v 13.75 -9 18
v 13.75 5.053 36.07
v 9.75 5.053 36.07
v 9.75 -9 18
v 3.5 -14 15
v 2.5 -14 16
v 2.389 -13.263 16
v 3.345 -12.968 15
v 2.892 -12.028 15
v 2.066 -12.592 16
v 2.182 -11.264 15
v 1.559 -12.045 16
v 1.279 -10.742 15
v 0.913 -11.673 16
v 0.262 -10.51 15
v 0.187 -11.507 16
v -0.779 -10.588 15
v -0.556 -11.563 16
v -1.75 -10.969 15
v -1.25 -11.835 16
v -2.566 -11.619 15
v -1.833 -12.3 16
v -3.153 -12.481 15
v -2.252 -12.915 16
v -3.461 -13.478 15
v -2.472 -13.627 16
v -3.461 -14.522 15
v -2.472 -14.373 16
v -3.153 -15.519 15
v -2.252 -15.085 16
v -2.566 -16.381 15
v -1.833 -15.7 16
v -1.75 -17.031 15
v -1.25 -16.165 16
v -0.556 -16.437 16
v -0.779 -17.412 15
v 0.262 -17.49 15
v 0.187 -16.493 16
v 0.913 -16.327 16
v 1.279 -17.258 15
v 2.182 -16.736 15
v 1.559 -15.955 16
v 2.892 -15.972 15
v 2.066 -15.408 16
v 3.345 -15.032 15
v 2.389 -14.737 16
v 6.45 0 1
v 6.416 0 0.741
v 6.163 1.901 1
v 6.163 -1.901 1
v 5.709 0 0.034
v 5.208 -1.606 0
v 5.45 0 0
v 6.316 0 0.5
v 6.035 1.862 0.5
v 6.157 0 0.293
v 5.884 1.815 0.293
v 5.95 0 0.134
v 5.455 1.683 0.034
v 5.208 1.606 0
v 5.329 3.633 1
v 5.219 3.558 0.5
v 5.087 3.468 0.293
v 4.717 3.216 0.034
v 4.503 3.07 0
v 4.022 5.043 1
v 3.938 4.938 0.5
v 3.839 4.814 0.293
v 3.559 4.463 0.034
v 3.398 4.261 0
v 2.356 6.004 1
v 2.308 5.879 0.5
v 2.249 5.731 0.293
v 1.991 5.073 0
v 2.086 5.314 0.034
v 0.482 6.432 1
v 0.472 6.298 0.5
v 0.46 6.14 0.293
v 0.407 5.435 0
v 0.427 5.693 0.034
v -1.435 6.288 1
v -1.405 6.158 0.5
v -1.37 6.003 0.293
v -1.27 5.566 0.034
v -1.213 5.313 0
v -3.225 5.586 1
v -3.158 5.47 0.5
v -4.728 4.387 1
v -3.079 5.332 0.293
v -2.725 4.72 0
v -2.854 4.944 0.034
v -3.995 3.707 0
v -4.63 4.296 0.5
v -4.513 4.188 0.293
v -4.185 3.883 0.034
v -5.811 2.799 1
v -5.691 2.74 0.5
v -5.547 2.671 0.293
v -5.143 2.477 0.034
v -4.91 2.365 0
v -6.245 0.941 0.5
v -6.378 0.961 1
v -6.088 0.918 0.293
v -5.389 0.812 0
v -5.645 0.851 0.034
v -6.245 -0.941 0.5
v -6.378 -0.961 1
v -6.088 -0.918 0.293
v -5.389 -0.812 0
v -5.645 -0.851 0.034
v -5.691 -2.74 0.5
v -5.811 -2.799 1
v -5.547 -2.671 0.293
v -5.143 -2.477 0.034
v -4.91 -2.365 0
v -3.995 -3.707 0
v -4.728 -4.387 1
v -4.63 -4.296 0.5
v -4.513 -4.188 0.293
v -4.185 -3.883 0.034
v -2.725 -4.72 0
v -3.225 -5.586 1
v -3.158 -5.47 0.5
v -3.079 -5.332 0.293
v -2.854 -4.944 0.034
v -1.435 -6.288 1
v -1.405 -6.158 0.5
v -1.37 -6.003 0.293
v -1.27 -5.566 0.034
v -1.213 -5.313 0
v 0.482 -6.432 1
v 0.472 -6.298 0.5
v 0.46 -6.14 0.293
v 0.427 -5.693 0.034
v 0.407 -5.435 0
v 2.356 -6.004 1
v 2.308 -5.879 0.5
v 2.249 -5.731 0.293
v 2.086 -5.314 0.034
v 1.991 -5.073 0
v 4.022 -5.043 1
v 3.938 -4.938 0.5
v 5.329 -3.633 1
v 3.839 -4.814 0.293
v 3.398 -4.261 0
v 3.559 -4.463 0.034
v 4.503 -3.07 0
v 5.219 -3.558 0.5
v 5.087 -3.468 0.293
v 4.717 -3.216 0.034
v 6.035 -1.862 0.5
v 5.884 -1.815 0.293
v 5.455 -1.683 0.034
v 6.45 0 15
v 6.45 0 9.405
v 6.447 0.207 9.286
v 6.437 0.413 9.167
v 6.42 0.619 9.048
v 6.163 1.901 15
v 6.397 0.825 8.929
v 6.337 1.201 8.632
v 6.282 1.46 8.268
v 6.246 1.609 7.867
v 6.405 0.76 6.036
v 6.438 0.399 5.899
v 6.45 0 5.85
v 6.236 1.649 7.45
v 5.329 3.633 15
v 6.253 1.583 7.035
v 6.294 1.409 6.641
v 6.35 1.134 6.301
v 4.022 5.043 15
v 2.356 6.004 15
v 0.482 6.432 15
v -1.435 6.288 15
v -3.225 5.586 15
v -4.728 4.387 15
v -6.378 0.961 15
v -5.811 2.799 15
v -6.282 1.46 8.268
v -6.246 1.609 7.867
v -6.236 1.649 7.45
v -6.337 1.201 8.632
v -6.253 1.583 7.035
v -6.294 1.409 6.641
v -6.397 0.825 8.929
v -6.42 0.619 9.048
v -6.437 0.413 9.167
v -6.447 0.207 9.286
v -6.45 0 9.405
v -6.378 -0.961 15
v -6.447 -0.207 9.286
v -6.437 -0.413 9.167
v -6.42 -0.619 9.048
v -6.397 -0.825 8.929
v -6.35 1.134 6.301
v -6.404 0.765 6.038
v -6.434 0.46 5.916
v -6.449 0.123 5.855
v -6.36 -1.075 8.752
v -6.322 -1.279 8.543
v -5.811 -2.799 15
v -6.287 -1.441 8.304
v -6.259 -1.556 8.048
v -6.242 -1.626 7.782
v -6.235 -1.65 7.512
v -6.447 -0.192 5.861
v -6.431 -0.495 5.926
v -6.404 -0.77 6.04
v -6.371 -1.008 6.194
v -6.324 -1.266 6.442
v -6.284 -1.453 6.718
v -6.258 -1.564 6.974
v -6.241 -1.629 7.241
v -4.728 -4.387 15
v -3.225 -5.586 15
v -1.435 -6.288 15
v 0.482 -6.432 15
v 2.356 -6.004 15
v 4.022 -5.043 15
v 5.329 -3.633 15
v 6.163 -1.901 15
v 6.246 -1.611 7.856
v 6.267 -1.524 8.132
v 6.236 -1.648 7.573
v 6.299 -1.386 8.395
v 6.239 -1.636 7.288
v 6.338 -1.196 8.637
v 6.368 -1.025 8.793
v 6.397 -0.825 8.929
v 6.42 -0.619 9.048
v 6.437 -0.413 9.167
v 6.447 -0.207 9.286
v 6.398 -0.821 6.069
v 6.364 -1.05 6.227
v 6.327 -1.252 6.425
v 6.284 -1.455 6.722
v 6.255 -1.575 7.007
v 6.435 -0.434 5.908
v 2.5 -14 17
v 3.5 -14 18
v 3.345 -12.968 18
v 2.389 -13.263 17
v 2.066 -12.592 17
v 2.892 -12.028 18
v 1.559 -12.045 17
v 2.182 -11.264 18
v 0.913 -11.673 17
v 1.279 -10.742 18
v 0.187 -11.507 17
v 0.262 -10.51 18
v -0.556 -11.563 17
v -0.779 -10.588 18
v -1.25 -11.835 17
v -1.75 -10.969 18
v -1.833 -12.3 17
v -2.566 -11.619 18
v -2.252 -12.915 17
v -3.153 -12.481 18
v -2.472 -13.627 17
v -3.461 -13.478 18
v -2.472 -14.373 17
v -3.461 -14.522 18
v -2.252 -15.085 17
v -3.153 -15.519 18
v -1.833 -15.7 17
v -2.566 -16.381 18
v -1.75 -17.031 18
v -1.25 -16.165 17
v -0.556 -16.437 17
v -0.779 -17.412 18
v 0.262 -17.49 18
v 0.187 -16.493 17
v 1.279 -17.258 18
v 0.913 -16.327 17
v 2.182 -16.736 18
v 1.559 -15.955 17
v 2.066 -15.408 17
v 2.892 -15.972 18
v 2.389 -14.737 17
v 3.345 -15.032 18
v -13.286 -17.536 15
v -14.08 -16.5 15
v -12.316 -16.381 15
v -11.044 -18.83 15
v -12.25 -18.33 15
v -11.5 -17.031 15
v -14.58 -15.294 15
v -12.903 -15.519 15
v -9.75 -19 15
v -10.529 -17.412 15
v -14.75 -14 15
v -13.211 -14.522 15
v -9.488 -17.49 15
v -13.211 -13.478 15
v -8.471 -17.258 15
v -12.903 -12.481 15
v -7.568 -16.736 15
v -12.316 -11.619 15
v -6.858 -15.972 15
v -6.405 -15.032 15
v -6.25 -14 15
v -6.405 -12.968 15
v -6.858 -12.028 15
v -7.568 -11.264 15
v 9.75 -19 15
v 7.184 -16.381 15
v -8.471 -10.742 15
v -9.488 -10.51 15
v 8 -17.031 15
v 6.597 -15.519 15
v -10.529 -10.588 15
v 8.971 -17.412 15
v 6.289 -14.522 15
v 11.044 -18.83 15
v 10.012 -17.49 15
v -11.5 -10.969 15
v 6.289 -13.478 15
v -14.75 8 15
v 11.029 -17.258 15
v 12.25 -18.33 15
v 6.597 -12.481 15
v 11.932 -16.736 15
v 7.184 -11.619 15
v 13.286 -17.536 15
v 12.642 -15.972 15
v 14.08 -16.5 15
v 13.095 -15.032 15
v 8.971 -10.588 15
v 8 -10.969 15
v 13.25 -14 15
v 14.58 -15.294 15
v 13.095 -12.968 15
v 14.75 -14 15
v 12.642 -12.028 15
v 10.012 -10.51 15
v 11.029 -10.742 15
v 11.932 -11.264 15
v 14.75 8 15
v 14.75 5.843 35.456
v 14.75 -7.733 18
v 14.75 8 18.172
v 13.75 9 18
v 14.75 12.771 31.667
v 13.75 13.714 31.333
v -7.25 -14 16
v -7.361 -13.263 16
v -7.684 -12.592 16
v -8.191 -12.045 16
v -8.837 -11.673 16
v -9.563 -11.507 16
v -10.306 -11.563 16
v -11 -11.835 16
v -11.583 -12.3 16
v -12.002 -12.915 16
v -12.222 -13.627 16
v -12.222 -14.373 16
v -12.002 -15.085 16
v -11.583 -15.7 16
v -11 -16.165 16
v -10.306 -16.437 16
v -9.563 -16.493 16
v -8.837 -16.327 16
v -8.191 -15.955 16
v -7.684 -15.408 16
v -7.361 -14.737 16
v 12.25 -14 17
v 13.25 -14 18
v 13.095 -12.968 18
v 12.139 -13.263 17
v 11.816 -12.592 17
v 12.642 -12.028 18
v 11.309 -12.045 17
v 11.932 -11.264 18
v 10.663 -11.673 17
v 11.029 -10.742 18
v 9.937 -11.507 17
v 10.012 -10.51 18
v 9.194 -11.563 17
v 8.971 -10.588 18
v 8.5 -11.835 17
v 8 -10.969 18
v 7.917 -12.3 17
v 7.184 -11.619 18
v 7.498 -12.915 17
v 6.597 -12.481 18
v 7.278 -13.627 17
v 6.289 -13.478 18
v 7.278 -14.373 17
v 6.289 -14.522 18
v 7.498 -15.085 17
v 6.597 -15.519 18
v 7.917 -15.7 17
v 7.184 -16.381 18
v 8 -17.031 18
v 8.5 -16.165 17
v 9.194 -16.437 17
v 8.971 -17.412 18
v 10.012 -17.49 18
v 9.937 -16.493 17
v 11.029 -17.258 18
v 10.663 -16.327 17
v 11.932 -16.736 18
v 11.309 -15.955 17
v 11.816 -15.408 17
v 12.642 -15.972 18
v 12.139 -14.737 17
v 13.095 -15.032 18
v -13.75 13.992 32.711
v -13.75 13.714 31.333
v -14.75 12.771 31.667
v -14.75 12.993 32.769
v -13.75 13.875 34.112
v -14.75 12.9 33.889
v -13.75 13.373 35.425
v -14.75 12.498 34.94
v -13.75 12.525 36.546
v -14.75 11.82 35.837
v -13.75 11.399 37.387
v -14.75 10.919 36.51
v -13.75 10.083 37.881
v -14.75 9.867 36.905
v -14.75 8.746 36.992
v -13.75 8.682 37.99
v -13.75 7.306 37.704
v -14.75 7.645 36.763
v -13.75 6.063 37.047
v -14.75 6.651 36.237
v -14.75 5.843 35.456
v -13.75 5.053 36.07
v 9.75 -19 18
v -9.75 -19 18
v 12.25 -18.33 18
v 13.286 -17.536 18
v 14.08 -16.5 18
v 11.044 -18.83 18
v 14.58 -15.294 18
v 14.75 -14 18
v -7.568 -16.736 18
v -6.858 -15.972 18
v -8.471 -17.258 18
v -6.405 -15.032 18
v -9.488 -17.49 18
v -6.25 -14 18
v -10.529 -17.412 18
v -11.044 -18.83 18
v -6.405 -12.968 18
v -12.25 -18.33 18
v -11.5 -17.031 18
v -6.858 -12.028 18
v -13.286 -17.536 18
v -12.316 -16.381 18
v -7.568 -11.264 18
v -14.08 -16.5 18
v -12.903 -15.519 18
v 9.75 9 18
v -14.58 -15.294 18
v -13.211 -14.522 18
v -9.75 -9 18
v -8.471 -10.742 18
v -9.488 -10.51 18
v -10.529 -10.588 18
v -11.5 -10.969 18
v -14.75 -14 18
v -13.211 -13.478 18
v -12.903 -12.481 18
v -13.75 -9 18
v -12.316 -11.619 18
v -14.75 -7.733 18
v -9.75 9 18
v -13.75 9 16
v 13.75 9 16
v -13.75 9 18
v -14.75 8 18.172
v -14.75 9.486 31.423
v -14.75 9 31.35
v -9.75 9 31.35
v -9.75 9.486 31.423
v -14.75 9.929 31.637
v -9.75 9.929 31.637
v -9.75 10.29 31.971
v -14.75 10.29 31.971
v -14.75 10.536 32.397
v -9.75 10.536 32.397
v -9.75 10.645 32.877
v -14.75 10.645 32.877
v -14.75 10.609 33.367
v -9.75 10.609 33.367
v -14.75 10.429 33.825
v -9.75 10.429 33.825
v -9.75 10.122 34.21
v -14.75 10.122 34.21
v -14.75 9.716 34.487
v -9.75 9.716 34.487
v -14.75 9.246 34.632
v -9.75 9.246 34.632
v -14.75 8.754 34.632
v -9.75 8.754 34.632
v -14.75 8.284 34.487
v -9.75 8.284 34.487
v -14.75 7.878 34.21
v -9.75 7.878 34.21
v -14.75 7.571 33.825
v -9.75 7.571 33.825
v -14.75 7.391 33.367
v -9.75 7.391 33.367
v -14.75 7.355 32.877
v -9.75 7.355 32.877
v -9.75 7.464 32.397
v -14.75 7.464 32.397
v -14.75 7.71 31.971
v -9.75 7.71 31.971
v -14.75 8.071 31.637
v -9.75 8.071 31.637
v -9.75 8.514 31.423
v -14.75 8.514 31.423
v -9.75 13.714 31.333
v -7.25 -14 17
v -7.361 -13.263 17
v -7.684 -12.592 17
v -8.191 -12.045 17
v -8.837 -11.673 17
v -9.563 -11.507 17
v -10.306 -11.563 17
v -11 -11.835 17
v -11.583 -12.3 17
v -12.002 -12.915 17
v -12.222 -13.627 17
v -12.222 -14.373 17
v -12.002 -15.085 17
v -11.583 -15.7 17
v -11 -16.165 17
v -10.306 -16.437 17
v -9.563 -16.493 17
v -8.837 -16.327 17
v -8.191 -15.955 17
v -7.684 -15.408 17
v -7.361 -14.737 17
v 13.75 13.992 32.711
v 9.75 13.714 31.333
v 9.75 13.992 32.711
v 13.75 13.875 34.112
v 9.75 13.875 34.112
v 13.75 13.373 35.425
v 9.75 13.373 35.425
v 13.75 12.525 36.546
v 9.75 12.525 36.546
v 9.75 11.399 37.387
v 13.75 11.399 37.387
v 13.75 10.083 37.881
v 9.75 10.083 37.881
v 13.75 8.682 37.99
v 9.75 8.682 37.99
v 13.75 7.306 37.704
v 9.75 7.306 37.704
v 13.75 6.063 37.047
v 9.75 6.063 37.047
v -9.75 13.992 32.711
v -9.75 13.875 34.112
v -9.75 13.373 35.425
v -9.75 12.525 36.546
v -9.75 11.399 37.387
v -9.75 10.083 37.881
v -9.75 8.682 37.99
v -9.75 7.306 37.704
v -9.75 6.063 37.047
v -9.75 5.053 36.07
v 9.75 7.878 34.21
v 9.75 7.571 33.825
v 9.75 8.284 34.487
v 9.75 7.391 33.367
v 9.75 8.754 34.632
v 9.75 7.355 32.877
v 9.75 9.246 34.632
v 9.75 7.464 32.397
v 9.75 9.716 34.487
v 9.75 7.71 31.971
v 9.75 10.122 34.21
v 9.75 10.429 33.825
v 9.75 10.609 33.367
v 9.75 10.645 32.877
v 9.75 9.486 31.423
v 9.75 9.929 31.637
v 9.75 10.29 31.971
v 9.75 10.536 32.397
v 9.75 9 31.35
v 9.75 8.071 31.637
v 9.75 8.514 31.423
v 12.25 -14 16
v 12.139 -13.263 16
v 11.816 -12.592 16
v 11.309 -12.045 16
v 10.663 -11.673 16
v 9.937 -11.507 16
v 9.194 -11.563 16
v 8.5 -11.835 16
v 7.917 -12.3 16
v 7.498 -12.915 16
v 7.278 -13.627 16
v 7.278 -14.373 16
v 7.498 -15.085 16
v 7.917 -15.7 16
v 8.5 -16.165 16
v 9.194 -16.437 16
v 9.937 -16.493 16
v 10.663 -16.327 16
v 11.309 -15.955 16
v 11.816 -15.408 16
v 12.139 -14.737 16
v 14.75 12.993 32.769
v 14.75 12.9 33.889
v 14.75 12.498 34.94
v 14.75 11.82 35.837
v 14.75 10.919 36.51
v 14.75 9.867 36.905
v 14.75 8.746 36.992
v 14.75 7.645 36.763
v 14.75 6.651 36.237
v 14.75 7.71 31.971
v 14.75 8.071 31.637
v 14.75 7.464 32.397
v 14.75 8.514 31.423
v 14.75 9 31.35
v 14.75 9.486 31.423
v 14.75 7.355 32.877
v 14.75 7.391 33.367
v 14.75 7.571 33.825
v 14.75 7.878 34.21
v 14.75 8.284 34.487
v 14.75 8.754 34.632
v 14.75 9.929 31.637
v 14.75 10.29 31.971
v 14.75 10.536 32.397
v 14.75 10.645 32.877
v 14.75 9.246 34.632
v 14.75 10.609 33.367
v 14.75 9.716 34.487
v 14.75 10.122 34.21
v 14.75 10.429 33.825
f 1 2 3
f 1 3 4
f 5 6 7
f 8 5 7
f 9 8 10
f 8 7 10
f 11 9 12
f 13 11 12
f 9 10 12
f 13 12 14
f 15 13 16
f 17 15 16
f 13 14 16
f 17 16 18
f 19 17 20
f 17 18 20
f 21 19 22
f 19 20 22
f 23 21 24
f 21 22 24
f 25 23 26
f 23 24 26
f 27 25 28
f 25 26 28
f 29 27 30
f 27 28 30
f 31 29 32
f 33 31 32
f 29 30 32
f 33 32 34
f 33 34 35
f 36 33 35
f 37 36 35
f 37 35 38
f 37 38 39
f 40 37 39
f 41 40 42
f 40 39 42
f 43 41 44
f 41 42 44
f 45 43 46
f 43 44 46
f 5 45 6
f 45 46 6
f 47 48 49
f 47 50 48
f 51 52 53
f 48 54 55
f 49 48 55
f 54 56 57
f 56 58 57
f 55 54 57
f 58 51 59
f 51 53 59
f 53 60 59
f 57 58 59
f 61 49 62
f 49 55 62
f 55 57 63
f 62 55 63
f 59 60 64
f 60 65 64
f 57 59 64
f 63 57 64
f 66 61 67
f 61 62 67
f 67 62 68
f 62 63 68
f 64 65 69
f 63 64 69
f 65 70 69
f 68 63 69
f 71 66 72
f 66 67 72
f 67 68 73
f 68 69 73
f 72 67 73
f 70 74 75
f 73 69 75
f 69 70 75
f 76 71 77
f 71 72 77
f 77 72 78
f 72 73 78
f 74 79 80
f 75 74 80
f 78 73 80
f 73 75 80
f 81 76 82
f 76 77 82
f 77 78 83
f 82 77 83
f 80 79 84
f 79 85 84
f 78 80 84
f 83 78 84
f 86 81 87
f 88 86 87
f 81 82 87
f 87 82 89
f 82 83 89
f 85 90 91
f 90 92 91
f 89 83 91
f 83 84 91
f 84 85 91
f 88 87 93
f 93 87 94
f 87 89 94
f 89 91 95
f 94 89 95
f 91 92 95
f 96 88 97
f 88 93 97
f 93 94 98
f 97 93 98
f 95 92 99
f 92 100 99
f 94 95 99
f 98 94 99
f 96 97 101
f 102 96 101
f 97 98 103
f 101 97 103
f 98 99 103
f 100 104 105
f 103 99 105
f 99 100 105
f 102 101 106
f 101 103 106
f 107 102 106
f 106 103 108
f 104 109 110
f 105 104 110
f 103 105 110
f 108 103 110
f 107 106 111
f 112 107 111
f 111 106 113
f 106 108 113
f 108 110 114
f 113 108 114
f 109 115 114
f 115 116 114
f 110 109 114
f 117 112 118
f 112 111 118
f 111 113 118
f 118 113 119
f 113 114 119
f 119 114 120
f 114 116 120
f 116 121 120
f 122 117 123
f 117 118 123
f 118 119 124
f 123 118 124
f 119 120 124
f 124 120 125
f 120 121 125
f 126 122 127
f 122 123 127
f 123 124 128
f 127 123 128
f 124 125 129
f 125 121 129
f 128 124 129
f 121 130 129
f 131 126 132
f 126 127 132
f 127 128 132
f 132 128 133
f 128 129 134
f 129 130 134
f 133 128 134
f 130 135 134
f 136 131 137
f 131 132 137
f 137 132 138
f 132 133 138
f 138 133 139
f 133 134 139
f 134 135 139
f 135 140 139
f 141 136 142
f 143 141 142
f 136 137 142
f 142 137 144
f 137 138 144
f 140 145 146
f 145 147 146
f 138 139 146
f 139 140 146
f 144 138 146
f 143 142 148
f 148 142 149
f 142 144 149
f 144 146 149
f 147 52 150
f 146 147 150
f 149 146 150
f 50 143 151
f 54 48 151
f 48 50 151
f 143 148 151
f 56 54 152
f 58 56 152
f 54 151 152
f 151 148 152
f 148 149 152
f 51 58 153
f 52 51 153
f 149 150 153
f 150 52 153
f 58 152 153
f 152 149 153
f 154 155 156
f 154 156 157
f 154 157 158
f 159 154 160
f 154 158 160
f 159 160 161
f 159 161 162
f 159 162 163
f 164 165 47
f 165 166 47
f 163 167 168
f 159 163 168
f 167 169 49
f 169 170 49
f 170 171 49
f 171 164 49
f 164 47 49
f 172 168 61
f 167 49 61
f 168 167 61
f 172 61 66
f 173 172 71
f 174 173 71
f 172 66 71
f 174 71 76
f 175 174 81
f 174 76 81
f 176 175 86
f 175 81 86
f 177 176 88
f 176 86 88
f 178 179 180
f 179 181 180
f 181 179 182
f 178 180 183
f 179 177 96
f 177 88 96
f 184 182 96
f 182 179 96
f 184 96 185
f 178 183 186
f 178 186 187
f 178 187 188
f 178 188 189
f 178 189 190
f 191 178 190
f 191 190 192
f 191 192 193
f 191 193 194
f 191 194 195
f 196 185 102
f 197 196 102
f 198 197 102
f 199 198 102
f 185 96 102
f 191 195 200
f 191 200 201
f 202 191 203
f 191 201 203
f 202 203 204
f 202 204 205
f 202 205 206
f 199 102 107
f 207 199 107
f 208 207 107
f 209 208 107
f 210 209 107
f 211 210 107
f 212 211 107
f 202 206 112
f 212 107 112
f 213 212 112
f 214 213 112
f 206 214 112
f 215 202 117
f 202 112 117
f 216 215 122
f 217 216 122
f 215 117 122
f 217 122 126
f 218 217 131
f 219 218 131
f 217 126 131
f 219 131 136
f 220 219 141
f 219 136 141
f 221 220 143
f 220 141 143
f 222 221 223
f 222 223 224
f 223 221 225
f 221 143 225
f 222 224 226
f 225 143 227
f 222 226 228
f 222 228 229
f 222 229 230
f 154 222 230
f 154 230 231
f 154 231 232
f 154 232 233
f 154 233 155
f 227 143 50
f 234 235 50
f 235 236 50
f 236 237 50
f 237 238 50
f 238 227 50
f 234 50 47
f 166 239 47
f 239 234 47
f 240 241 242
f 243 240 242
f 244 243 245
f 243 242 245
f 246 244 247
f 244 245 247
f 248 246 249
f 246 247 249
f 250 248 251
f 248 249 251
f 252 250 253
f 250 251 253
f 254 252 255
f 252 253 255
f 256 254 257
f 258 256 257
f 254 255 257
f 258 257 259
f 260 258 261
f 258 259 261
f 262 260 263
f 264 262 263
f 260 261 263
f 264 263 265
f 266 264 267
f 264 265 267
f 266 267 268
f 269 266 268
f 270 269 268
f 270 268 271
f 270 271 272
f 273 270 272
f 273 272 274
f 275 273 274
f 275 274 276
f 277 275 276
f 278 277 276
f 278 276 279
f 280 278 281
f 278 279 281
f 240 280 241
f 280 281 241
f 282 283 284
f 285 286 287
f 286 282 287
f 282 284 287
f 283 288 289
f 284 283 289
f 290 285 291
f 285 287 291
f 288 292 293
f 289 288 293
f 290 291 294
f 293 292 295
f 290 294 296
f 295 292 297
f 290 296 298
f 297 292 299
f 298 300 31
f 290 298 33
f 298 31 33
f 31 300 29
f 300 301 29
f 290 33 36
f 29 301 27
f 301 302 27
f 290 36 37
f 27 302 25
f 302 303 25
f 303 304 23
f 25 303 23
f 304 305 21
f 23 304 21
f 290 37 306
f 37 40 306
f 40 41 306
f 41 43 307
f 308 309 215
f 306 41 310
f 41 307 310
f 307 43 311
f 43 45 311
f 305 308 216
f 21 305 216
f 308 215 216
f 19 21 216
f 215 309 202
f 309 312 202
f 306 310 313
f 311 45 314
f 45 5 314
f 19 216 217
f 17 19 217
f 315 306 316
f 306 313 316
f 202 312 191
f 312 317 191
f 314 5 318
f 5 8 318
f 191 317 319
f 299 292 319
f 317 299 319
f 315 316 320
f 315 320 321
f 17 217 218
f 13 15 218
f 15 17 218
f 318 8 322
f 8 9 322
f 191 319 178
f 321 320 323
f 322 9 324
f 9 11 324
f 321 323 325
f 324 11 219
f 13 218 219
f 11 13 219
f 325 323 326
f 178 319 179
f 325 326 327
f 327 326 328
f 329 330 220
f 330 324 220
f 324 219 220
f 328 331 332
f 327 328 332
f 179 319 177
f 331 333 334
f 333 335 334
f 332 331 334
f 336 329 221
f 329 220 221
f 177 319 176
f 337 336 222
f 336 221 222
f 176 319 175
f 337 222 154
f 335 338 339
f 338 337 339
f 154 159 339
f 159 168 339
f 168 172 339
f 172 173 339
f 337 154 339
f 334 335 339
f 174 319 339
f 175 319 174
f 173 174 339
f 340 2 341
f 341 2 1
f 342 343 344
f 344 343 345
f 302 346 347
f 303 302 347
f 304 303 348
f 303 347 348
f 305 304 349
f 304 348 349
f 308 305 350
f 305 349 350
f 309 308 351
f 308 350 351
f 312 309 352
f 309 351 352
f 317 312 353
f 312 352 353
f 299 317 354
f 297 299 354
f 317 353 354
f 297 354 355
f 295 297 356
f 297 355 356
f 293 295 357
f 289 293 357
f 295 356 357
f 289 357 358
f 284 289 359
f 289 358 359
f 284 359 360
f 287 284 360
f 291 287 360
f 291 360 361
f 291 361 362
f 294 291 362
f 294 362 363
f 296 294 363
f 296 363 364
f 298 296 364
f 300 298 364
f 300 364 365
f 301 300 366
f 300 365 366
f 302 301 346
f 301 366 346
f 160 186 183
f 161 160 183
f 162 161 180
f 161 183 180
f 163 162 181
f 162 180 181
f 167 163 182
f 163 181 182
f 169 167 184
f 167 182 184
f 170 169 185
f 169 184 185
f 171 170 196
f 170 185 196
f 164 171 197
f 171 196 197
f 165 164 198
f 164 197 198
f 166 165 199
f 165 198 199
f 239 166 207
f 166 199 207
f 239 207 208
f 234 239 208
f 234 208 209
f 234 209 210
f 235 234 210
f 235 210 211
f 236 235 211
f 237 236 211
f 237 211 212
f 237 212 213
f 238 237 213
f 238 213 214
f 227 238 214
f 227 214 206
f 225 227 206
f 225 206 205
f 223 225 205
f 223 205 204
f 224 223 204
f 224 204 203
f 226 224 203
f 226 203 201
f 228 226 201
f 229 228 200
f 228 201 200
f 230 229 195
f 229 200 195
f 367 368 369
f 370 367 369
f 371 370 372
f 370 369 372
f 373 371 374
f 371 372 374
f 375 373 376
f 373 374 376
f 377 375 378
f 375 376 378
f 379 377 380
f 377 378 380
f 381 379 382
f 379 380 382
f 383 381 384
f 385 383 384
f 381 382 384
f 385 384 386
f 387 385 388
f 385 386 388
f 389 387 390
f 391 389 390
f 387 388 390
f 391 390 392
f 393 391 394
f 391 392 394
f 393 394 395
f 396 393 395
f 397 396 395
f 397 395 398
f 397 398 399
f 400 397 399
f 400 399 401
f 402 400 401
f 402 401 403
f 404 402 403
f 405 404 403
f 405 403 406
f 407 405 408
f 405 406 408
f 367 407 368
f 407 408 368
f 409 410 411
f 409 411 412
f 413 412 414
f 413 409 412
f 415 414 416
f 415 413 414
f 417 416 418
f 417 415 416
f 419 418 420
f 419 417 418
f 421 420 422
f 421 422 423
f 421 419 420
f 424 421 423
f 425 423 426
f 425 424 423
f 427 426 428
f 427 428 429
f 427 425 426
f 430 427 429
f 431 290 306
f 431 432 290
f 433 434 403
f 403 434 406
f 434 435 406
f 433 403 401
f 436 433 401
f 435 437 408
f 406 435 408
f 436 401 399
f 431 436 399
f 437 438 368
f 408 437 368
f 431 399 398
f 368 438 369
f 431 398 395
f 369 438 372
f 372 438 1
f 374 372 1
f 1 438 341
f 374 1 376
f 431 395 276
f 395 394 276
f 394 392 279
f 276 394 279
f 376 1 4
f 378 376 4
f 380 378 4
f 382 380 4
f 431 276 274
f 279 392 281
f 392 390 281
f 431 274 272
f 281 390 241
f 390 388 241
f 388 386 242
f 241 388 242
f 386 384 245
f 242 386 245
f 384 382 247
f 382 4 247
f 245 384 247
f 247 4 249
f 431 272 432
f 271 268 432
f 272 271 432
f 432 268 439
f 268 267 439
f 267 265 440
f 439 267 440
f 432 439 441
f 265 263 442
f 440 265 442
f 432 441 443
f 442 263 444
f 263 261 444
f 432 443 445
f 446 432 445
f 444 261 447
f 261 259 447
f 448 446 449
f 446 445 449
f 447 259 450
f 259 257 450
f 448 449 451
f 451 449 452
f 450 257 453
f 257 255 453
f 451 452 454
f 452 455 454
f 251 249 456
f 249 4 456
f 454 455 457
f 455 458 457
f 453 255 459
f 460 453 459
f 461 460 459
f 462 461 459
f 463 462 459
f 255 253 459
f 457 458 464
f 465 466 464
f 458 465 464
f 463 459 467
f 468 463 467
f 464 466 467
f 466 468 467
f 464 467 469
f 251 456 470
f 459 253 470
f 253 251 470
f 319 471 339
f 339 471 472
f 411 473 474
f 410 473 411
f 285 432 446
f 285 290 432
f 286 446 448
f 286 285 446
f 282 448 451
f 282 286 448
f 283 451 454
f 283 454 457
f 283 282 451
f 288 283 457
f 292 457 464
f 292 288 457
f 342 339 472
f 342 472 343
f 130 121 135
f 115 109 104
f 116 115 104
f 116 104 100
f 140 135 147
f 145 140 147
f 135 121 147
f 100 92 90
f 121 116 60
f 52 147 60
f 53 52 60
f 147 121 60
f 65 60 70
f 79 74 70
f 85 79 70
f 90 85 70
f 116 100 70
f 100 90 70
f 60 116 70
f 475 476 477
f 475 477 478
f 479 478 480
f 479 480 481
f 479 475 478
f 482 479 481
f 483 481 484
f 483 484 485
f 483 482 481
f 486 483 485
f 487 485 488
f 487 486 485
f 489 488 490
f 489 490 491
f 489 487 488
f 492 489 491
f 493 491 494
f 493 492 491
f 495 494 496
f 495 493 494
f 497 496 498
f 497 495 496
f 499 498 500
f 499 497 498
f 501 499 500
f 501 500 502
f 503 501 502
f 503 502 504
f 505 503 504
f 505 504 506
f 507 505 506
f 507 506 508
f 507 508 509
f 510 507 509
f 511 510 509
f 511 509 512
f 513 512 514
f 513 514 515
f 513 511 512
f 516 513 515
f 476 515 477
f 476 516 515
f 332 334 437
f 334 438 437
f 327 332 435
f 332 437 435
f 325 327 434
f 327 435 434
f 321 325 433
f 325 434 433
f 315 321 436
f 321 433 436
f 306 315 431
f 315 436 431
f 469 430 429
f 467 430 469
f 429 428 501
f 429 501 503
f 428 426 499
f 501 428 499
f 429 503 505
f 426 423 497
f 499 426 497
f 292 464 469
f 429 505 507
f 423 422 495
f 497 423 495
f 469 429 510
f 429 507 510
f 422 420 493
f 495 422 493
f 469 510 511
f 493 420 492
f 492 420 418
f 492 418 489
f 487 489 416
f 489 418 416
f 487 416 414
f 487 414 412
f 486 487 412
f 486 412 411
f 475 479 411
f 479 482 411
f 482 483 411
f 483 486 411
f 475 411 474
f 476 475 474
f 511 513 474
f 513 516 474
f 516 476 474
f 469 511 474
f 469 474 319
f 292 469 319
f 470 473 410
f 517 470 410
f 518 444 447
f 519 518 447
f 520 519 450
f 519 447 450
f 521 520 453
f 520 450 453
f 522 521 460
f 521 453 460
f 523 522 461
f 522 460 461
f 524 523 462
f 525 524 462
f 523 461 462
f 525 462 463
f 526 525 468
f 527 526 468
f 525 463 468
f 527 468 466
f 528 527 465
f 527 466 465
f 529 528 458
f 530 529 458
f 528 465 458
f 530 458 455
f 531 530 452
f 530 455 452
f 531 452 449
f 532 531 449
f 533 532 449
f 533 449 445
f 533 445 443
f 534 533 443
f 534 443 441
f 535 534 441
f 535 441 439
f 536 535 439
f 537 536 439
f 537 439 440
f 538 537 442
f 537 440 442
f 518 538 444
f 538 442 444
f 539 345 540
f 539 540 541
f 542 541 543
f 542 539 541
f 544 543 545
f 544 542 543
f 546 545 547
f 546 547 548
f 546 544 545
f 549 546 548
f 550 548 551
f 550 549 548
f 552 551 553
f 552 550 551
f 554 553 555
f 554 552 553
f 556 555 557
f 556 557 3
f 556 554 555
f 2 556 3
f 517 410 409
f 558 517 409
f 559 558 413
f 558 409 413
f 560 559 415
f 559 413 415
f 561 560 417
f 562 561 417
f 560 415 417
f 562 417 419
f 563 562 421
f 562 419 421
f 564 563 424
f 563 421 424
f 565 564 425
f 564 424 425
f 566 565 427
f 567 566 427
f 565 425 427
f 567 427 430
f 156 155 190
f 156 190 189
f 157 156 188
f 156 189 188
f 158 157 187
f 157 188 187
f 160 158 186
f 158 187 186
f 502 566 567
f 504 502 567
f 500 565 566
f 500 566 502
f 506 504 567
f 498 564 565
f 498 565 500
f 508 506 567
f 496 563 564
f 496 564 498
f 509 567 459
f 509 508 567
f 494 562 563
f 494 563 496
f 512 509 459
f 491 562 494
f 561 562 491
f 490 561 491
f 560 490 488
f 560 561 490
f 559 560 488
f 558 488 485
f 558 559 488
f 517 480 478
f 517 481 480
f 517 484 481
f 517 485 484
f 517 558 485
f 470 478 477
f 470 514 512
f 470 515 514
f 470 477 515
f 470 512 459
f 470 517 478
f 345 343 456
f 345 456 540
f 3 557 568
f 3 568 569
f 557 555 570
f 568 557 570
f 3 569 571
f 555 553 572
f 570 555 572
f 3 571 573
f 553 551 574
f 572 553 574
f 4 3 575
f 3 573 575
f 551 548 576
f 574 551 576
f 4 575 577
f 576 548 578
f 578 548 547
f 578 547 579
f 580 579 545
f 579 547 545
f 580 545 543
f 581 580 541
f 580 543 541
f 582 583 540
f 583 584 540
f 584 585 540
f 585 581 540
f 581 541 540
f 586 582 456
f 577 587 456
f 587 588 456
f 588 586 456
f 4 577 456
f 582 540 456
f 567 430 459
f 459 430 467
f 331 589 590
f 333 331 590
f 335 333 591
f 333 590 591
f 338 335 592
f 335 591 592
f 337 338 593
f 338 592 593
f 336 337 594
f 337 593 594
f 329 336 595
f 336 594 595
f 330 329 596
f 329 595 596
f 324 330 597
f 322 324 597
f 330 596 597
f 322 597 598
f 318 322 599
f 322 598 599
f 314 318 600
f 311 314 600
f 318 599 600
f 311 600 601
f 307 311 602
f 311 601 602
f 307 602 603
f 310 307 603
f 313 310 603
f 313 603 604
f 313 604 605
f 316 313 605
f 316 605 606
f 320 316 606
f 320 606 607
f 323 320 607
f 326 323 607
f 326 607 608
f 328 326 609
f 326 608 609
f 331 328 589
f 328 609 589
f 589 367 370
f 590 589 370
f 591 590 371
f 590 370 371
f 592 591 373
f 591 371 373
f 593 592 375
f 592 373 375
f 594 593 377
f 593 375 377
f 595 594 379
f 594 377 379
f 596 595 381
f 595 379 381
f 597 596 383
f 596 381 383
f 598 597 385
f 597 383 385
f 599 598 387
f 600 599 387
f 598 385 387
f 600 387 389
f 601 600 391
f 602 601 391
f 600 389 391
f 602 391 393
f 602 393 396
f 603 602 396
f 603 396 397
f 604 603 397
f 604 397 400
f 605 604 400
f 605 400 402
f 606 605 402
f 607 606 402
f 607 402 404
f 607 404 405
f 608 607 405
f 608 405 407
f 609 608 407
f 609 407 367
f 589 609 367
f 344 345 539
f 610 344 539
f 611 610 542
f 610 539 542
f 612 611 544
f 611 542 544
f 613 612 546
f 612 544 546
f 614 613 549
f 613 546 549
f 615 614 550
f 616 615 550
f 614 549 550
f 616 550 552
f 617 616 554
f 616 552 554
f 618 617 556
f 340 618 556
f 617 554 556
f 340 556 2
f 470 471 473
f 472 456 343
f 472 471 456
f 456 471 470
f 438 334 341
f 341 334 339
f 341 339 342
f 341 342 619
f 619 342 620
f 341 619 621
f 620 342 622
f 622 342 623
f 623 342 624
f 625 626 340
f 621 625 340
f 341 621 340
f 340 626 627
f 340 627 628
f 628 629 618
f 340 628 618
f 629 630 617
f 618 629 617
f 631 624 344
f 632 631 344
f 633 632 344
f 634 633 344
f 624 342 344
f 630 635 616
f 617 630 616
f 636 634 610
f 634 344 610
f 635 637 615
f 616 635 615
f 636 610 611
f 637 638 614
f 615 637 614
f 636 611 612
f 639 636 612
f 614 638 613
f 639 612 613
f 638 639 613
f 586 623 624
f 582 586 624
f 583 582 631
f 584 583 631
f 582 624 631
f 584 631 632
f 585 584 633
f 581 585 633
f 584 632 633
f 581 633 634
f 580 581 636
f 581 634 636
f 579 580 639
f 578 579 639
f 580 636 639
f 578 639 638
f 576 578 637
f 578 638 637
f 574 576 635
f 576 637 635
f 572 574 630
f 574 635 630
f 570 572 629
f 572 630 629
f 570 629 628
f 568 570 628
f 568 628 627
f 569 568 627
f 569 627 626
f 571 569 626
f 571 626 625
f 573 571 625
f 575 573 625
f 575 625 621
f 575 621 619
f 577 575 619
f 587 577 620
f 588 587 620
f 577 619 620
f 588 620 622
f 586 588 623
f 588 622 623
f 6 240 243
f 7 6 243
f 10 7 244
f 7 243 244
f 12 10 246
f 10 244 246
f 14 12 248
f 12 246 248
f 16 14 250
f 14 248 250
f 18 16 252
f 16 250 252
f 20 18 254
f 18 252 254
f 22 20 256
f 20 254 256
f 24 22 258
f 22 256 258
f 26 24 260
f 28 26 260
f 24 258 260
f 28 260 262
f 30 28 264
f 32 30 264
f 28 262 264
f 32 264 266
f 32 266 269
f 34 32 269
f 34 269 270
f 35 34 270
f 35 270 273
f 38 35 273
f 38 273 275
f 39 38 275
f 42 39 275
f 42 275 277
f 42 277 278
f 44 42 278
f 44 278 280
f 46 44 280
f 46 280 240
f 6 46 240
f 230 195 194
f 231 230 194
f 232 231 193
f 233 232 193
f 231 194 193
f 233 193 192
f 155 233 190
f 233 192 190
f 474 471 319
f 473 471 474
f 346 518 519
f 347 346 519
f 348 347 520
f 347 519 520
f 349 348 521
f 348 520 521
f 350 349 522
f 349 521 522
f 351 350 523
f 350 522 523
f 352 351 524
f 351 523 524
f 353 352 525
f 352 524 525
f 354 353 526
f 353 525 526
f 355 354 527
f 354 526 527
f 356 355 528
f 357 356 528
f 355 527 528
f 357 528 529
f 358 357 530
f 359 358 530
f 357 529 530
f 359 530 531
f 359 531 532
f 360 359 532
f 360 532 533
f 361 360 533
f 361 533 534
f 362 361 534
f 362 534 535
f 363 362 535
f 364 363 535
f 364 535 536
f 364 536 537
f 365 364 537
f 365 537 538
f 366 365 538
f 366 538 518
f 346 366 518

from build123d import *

# Parameters (mm, degrees)
SKETCH_1_R               = 6.45
EXTRUDE_1_DEPTH          = 15
SKETCH_2_W               = 29.5
SKETCH_2_H               = 18
EXTRUDE_2_DEPTH          = 3
EXTRUDE_START            = 14.75
SKETCH_3_R               = 1.65
EXTRUDE_3_DEPTH          = 5
EXTRUDE_START_2          = -14.75
SKETCH_3_2_R             = 1.65
EXTRUDE_4_DEPTH          = 5
EXTRUDE_5_DEPTH          = 10
FILLET_1_R               = 5
SKETCH_5_R               = 2.5
CUT_EXTRUDE_1_DEPTH      = 19
CHAMFER_1_SIZE           = 1
CHAMFER_2_SIZE           = 1
CUT_EXTRUDE_2_DEPTH      = 15.75
CUT_EXTRUDE_2_DEPTH_BACK = 15.75
FILLET_2_R               = 1


with BuildPart() as part:
    # ｽｹｯﾁ1 → ﾎﾞｽ - 押し出し1 (new body)
    with BuildSketch(Plane.XY):
        Circle(SKETCH_1_R)
    extrude(amount=EXTRUDE_1_DEPTH)

    # ｽｹｯﾁ2 → ﾎﾞｽ - 押し出し2 (add)
    with BuildSketch(Plane.XY.offset(15)):
        Rectangle(SKETCH_2_W, SKETCH_2_H)
    extrude(amount=EXTRUDE_2_DEPTH)

    # ｽｹｯﾁ3 → ﾎﾞｽ - 押し出し3 (add)
    with BuildSketch(Plane(origin=(0, 0, 0), x_dir=(0, 0, -1), z_dir=(1, 0, 0)).offset(EXTRUDE_START)):
        with BuildLine():
            Line((-18, 9), (-31.333333333, 13.714045208))
            ThreePointArc((-31.333333333, 13.714045208), (-37.386897866, 11.398984601), (-36.069570429, 5.053135753))
            Line((-36.069570429, 5.053135753), (-18, -9))
            Line((-18, -9), (-18, 9))
        make_face()
        with Locations((-33, 9)):
            Circle(SKETCH_3_R, mode=Mode.SUBTRACT)
    extrude(amount=-EXTRUDE_3_DEPTH)

    # ｽｹｯﾁ3<2> → ﾎﾞｽ - 押し出し4 (add)
    with BuildSketch(Plane(origin=(0, 0, 0), x_dir=(0, 0, -1), z_dir=(1, 0, 0)).offset(EXTRUDE_START_2)):
        with BuildLine():
            Line((-18, 9), (-31.333333333, 13.714045208))
            ThreePointArc((-31.333333333, 13.714045208), (-37.386897866, 11.398984601), (-36.069570429, 5.053135753))
            Line((-36.069570429, 5.053135753), (-18, -9))
            Line((-18, -9), (-18, 9))
        make_face()
        with Locations((-33, 9)):
            Circle(SKETCH_3_2_R, mode=Mode.SUBTRACT)
    extrude(amount=EXTRUDE_4_DEPTH)

    # ｽｹｯﾁ4 → ﾎﾞｽ - 押し出し5 (add)
    with BuildSketch(Plane.XZ.offset(9)):
        Polygon((-14.75, 15), (14.75, 15), (14.75, 18), (9.75, 18), (-9.75, 18), (-14.75, 18), align=None)
    extrude(amount=EXTRUDE_5_DEPTH)

    # ﾌｨﾚｯﾄ1
    fillet_1_edges = [part.edges().sort_by_distance(p)[0] for p in [
        (-14.75, -19, 16.5),
        (14.75, -19, 16.5),
    ]]
    fillet(fillet_1_edges, radius=FILLET_1_R)

    # ｽｹｯﾁ5 → ｶｯﾄ - 押し出し1 (cut, through all)
    with BuildSketch(Plane.XY.offset(18)):
        with Locations((0, -14)):
            Circle(SKETCH_5_R)
        with Locations((-9.75, -14)):
            Circle(SKETCH_5_R)
        with Locations((9.75, -14)):
            Circle(SKETCH_5_R)
    extrude(amount=-CUT_EXTRUDE_1_DEPTH, mode=Mode.SUBTRACT)

    # 面取り1
    chamfer_1_edges = [part.edges().sort_by_distance(p)[0] for p in [
        (7.25, -14, 15),
        (7.25, -14, 18),
        (-12.25, -14, 15),
        (-12.25, -14, 18),
        (-2.5, -14, 15),
        (-2.5, -14, 18),
    ]]
    chamfer(chamfer_1_edges, length=CHAMFER_1_SIZE)

    # 面取り2
    chamfer_2_edges = [part.edges().sort_by_distance(p)[0] for p in [
        (-14.75, 9, 16.5),
        (0, 9, 15),
        (14.75, 9, 16.5),
        (-14.75, 11.357022604, 24.666666667),
        (-14.75, 11.398984601, 37.386897866),
        (-14.75, -1.973432123, 27.034785215),
        (14.75, 11.357022604, 24.666666667),
        (14.75, 11.398984601, 37.386897866),
        (14.75, -1.973432123, 27.034785215),
    ]]
    chamfer(chamfer_2_edges, length=CHAMFER_2_SIZE)

    # ｽｹｯﾁ6 → ｶｯﾄ - 押し出し2 (cut, two sides)
    with BuildSketch(Plane(origin=(0, 0, 0), x_dir=(0, 0, -1), z_dir=(1, 0, 0))) as cut_extrude_2_sk:
        with BuildLine():
            Line((-8.928941916, -0.825), (-9.405255888, 0))
            Line((-9.405255888, 0), (-8.928941916, 0.825))
            ThreePointArc((-8.928941916, 0.825), (-5.85, 0), (-8.928941916, -0.825))
        make_face()
    extrude(amount=CUT_EXTRUDE_2_DEPTH, mode=Mode.SUBTRACT)
    extrude(cut_extrude_2_sk.sketch, amount=-CUT_EXTRUDE_2_DEPTH_BACK, mode=Mode.SUBTRACT)

    # ﾌｨﾚｯﾄ2
    fillet_2_edges = [part.edges().sort_by_distance(p)[0] for p in [
        (-6.45, 0, 0),
    ]]
    fillet(fillet_2_edges, radius=FILLET_2_R)


solid = part.part
